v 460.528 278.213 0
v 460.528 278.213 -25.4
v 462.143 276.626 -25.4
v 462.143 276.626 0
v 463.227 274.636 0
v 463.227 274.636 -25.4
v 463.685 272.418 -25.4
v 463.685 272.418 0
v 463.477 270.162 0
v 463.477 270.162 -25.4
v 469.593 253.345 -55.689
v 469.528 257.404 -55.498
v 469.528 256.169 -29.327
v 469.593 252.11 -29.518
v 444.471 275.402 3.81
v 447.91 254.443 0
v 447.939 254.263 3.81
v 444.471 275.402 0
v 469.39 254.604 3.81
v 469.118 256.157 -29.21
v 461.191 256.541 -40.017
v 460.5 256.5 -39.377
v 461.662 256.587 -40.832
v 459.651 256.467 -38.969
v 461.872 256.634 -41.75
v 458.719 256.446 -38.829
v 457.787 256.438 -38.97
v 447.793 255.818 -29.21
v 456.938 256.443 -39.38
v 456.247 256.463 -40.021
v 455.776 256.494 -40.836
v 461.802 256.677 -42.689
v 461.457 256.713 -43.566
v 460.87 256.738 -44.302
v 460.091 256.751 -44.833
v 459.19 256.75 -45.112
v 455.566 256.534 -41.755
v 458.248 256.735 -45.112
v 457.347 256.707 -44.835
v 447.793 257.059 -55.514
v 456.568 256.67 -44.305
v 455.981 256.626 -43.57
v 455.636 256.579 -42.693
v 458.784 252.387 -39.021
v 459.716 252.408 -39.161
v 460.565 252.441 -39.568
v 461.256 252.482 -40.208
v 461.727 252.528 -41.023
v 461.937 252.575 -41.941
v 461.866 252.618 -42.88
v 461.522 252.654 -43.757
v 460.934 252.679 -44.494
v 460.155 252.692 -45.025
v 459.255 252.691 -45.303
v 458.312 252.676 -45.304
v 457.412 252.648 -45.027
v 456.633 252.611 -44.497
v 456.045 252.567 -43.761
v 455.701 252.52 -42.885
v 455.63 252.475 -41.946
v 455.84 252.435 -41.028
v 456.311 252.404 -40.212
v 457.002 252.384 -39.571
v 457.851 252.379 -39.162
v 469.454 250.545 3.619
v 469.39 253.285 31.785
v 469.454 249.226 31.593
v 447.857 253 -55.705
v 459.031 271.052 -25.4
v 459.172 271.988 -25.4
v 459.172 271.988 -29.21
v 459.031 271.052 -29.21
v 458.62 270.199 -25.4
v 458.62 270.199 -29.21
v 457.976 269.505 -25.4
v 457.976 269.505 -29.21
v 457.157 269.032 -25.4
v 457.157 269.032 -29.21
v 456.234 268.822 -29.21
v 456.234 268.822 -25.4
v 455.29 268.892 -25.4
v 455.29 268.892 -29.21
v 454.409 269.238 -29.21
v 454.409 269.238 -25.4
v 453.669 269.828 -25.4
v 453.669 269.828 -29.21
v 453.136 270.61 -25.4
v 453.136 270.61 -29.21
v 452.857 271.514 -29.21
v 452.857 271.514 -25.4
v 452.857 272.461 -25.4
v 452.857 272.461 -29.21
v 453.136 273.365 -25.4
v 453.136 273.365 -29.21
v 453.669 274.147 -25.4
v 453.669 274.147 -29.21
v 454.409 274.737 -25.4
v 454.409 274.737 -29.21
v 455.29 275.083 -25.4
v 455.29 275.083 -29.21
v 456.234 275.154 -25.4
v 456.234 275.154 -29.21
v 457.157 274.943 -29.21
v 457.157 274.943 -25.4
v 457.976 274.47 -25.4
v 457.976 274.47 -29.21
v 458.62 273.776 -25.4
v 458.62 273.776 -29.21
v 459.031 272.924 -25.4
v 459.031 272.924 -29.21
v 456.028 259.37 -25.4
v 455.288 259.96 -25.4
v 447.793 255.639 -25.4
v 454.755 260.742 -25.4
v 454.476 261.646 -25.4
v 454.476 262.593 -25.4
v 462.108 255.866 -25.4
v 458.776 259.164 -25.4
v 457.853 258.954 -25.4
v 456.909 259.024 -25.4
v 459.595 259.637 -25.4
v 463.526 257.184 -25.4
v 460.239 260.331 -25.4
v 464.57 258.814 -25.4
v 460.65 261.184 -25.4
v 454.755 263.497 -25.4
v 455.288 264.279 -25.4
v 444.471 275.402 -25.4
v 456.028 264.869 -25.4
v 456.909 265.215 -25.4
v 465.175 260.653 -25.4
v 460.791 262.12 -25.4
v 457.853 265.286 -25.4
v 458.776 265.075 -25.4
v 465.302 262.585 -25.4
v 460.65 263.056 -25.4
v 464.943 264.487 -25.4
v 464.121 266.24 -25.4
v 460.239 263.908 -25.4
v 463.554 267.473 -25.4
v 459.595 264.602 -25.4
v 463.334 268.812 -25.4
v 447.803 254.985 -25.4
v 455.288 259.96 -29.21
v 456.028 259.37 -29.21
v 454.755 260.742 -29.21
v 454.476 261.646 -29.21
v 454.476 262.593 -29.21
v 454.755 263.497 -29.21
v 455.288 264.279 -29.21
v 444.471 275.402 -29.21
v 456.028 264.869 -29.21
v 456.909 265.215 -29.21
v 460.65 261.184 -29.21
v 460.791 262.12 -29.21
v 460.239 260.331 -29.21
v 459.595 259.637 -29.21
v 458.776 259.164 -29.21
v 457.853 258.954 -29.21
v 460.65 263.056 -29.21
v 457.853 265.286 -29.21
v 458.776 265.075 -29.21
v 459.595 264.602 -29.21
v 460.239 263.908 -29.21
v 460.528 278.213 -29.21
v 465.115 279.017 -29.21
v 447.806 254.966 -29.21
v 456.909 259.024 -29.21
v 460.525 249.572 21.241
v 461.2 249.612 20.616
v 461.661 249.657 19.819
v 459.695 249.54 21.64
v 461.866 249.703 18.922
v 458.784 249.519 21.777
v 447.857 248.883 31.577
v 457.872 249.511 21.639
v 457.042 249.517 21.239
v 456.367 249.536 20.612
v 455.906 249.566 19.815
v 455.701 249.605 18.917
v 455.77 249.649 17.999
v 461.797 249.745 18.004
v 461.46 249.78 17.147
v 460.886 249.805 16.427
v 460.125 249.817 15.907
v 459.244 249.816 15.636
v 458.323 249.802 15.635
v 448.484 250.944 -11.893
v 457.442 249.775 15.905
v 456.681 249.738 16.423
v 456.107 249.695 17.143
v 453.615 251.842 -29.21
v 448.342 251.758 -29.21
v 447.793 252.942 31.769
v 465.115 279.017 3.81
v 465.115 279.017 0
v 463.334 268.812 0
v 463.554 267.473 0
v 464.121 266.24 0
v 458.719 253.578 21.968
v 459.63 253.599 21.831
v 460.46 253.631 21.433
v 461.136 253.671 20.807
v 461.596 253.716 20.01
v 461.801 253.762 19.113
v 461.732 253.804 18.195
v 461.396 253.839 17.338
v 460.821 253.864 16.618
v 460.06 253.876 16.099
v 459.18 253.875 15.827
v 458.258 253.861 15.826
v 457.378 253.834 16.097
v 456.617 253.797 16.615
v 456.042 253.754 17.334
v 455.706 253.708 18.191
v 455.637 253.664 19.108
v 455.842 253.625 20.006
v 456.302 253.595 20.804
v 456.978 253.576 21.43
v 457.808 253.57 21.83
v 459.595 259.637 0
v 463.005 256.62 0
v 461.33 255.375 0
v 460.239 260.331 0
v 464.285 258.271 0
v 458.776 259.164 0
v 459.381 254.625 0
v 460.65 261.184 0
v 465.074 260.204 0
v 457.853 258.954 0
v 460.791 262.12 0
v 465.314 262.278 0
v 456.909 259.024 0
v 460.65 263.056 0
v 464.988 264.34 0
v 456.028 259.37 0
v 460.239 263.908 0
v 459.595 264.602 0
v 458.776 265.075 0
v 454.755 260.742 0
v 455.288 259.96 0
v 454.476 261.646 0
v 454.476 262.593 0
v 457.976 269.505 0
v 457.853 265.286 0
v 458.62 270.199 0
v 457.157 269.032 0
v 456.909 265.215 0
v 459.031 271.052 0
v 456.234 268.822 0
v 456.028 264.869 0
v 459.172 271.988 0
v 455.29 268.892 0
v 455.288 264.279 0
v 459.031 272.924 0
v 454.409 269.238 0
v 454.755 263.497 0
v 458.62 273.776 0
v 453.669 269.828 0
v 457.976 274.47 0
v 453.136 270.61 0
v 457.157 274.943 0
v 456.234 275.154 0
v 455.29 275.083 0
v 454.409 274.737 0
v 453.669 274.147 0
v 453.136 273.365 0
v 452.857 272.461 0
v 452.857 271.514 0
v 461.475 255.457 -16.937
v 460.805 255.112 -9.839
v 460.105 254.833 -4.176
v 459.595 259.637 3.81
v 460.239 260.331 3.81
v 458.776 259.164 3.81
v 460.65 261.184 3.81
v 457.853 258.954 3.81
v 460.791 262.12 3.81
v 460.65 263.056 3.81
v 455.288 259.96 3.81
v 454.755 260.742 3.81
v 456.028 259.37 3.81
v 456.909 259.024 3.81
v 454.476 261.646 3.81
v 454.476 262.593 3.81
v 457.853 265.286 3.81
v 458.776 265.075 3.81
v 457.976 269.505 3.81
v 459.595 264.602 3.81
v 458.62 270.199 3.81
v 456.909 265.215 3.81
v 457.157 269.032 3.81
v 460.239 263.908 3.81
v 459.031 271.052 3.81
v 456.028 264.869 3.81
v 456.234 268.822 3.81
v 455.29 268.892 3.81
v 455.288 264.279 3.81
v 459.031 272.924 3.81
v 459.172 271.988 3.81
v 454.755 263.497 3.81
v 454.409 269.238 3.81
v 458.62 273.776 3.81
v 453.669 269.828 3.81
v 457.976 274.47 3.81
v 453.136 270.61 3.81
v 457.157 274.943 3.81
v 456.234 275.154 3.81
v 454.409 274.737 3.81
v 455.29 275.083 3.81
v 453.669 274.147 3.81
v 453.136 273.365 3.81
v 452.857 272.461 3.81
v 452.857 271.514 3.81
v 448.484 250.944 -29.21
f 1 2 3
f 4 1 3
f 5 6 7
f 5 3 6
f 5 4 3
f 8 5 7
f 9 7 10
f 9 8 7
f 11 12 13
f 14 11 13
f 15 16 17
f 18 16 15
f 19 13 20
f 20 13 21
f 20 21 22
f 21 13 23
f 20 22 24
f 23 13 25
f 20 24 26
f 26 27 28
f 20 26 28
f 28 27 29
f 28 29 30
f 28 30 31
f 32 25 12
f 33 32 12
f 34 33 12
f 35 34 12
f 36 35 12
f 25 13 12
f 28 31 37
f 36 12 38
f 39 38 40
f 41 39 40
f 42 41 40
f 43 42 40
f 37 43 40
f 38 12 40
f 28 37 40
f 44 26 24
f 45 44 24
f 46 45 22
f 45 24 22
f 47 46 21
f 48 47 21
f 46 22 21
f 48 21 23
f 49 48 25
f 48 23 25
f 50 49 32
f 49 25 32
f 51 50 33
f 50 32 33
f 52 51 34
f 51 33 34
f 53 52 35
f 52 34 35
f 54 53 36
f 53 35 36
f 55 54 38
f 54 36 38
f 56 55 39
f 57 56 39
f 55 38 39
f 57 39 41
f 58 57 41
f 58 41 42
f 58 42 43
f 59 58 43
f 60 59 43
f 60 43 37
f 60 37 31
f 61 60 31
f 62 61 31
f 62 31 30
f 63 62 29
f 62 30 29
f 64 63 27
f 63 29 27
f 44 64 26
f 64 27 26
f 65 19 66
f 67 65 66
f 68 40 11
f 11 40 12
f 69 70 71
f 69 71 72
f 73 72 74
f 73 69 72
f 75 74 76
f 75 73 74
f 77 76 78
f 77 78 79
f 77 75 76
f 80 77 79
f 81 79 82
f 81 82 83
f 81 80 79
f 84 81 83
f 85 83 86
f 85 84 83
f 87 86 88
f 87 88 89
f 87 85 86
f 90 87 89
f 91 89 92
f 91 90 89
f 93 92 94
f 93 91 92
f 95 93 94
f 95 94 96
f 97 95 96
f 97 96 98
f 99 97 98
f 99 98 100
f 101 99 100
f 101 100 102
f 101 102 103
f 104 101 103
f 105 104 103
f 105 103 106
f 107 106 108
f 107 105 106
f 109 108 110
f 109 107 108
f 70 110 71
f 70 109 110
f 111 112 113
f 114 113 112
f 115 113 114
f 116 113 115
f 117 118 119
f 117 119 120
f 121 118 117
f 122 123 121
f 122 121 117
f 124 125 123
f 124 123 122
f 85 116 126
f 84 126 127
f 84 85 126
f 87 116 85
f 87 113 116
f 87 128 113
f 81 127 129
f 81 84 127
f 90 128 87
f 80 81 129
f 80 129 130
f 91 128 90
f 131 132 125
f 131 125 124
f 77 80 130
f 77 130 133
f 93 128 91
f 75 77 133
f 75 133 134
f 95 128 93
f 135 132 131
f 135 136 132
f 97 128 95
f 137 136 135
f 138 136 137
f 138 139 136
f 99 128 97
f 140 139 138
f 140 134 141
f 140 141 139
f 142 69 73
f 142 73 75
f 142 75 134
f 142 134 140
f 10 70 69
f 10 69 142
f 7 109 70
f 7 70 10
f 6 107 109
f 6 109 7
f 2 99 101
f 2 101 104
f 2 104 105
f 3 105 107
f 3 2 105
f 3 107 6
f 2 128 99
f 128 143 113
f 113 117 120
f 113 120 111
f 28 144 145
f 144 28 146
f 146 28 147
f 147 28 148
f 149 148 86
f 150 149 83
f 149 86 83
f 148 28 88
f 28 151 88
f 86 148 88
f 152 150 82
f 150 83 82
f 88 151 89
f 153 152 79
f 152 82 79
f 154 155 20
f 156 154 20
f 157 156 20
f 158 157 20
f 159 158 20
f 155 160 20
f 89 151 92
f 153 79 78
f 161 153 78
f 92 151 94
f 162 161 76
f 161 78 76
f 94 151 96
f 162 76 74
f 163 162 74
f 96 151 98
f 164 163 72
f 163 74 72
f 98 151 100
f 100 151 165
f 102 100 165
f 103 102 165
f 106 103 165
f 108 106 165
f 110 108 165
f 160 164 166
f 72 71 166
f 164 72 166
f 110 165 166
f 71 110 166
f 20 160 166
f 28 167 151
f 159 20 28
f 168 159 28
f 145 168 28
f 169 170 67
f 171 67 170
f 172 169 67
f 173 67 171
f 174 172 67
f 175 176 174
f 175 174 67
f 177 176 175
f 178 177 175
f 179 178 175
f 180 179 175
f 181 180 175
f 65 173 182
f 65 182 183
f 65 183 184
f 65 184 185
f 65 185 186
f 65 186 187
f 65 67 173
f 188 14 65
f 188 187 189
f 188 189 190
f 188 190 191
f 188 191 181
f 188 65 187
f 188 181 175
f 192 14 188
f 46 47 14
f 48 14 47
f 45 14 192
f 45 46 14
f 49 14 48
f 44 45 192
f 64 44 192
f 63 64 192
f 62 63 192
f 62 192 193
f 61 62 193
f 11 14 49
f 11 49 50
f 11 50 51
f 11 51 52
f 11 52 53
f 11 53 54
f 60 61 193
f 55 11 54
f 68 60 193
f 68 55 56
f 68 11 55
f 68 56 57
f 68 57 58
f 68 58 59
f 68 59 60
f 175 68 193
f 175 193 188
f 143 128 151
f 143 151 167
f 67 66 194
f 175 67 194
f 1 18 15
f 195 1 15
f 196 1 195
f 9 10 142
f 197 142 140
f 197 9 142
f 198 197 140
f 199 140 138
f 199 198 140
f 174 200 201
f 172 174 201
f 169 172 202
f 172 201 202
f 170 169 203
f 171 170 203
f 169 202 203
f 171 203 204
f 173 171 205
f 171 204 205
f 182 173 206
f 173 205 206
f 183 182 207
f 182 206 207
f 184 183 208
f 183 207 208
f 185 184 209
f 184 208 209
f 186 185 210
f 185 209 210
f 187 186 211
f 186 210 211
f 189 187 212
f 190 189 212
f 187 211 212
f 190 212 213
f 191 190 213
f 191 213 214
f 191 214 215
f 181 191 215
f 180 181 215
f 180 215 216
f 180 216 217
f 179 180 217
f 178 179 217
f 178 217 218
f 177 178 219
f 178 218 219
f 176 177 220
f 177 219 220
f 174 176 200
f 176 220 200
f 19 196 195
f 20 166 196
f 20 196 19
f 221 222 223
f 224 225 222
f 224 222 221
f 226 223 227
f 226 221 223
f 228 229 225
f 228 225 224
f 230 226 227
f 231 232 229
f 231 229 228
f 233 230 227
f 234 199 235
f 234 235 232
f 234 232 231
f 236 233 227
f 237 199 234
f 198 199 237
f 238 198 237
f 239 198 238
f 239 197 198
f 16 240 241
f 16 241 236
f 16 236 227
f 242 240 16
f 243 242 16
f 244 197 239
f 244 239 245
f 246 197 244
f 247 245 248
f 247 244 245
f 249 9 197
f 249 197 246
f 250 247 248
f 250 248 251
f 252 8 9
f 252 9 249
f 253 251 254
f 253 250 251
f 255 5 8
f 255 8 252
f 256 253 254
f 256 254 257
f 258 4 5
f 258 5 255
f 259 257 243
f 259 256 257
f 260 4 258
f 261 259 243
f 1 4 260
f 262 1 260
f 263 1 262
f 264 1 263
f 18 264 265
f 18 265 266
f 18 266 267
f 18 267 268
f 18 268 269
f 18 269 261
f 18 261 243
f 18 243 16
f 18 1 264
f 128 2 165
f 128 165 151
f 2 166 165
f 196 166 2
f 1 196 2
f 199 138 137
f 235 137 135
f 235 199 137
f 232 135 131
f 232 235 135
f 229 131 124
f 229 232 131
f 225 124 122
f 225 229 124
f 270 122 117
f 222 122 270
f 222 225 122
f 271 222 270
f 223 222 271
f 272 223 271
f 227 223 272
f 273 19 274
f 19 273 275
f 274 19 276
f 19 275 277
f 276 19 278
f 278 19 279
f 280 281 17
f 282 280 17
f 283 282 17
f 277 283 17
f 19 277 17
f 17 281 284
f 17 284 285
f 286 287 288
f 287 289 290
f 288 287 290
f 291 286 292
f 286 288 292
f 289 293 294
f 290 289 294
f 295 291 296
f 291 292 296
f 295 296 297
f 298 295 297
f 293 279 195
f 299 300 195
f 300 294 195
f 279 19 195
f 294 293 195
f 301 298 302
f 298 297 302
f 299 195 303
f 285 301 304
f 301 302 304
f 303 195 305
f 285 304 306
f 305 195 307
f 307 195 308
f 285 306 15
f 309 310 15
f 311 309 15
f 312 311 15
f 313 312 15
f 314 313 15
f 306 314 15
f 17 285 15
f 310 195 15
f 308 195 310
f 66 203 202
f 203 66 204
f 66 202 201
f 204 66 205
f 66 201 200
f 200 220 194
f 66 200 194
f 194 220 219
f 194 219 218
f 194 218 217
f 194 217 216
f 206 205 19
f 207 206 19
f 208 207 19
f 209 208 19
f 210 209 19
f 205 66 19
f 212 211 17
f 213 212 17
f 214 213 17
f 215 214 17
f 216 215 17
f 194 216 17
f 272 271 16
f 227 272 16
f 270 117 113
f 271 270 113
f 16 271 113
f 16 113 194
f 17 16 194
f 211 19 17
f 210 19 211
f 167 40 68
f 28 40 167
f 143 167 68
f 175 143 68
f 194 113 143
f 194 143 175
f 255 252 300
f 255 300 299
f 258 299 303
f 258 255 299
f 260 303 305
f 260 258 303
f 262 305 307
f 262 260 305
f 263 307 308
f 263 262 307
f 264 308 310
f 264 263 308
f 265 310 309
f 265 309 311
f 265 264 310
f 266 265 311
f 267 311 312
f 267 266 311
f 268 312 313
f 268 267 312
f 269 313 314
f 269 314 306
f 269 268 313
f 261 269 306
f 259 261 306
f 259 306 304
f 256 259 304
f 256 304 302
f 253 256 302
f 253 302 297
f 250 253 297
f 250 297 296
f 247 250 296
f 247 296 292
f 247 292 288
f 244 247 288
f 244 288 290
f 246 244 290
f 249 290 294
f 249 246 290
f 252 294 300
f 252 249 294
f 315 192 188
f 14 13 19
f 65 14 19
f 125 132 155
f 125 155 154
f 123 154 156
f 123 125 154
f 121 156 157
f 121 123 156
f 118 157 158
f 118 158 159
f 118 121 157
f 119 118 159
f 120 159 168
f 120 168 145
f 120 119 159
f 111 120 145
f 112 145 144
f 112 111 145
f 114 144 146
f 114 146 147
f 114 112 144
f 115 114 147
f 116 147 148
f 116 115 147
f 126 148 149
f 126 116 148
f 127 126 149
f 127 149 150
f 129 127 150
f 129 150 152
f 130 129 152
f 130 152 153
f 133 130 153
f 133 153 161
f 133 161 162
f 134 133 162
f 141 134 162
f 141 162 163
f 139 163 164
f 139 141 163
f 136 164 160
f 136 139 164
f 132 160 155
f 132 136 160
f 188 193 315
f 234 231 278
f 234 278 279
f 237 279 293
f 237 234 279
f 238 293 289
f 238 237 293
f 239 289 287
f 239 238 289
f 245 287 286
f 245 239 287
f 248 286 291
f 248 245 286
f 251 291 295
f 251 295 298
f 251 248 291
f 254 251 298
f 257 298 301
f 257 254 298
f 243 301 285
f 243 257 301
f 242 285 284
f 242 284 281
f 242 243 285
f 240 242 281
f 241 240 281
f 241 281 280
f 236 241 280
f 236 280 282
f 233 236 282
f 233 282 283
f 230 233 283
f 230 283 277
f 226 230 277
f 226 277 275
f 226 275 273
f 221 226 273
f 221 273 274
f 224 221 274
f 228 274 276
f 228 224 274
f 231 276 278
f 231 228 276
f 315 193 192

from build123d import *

# Parameters (mm, degrees)
BOSS_EXTRUDE1_DEPTH = 29.21
SKETCH2_R           = 3.175
BOSS_EXTRUDE2_DEPTH = 3.81
BOSS_EXTRUDE3_START = -3.81
SKETCH3_R           = 3.175
BOSS_EXTRUDE3_DEPTH = 3.81
SKETCH4_R           = 3.162370232
SKETCH4_R_2         = 3.091345033
BOSS_EXTRUDE4_DEPTH = 4.064


with BuildPart() as part:
    # Sketch1 → Boss-Extrude1 (new body)
    with BuildSketch(Plane.XY):
        with BuildLine():
            Line((458.862647092, 254.521445295), (448.165127061, 252.766085749))
            Line((448.165127061, 252.766085749), (448.484233443, 250.943633746))
            Line((448.484233443, 250.943633746), (469.389805578, 254.604142486))
            Line((469.389805578, 254.604142486), (465.115245634, 279.016629277))
            Line((465.115245634, 279.016629277), (460.527946701, 278.213405728))
            ThreePointArc((460.527946701, 278.213405728), (463.226929453, 274.636254744), (463.477224231, 270.162121354))
            ThreePointArc((463.477224231, 270.162121354), (463.399405765, 268.135304283), (464.120754615, 266.239598875))
            ThreePointArc((464.120754615, 266.239598875), (464.640877411, 258.967440337), (458.862647092, 254.521445295))
        make_face()
    extrude(amount=-BOSS_EXTRUDE1_DEPTH)

    # Sketch2 → Boss-Extrude2 (add)
    with BuildSketch(Plane.XY):
        Polygon((465.115245634, 279.016629277), (469.389805578, 254.604142486), (448.484233443, 250.943633746), (444.470875732, 275.401856337), align=None)
        with Locations((457.615851502, 262.119672583)):
            Circle(SKETCH2_R, mode=Mode.SUBTRACT)
        with Locations((455.996603091, 271.987703521)):
            Circle(SKETCH2_R, mode=Mode.SUBTRACT)
    extrude(amount=BOSS_EXTRUDE2_DEPTH)

    # Sketch3 → Boss-Extrude3 (add)
    with BuildSketch(Plane(origin=(0, 0, -29.21), x_dir=(-1, 0, 0), z_dir=(0, 0, -1)).offset(BOSS_EXTRUDE3_START)):
        with BuildLine():
            Line((-460.527946701, 278.213405728), (-444.470875732, 275.401856337))
            Line((-444.470875732, 275.401856337), (-448.165127061, 252.766085749))
            Line((-448.165127061, 252.766085749), (-458.862647092, 254.521445295))
            ThreePointArc((-458.862647092, 254.521445295), (-464.640877411, 258.967440337), (-464.120754615, 266.239598875))
            ThreePointArc((-464.120754615, 266.239598875), (-463.399405765, 268.135304283), (-463.477224231, 270.162121354))
            ThreePointArc((-463.477224231, 270.162121354), (-463.226929453, 274.636254744), (-460.527946701, 278.213405728))
        make_face()
        with Locations(Location((-457.615851502, 262.119672583, 0), (0, 0, 180))):
            Circle(SKETCH3_R, mode=Mode.SUBTRACT)
        with Locations(Location((-455.996603091, 271.987703521, 0), (0, 0, 180))):
            Circle(SKETCH3_R, mode=Mode.SUBTRACT)
    extrude(amount=BOSS_EXTRUDE3_DEPTH)

    # Sketch4 → Boss-Extrude4 (add)
    with BuildSketch(Plane(origin=(-3.919475367, 246.715707824, 11.636685294), x_dir=(0.9998741117550616, 0.01584934704377867, 0.0007475562269396132), z_dir=(-0.01586696700779868, 0.9987637706378837, 0.047108065330370395))):
        Polygon((451.768985456, 41.36328589), (451.768985456, 67.563393238), (473.507185402, 67.563393238), (473.507185402, 41.36328589), (473.368872521, 8.189649592), (473.368872521, -19.816380435), (451.768985456, -19.816380435), align=None)
        with Locations(Location((462.696745397, 54.030860165, 0), (0, 0, 270))):
            Circle(SKETCH4_R, mode=Mode.SUBTRACT)
        with Locations(Location((462.696745397, -6.905130234, 0), (0, 0, 270))):
            Circle(SKETCH4_R_2, mode=Mode.SUBTRACT)
    extrude(amount=-BOSS_EXTRUDE4_DEPTH)


solid = part.part
